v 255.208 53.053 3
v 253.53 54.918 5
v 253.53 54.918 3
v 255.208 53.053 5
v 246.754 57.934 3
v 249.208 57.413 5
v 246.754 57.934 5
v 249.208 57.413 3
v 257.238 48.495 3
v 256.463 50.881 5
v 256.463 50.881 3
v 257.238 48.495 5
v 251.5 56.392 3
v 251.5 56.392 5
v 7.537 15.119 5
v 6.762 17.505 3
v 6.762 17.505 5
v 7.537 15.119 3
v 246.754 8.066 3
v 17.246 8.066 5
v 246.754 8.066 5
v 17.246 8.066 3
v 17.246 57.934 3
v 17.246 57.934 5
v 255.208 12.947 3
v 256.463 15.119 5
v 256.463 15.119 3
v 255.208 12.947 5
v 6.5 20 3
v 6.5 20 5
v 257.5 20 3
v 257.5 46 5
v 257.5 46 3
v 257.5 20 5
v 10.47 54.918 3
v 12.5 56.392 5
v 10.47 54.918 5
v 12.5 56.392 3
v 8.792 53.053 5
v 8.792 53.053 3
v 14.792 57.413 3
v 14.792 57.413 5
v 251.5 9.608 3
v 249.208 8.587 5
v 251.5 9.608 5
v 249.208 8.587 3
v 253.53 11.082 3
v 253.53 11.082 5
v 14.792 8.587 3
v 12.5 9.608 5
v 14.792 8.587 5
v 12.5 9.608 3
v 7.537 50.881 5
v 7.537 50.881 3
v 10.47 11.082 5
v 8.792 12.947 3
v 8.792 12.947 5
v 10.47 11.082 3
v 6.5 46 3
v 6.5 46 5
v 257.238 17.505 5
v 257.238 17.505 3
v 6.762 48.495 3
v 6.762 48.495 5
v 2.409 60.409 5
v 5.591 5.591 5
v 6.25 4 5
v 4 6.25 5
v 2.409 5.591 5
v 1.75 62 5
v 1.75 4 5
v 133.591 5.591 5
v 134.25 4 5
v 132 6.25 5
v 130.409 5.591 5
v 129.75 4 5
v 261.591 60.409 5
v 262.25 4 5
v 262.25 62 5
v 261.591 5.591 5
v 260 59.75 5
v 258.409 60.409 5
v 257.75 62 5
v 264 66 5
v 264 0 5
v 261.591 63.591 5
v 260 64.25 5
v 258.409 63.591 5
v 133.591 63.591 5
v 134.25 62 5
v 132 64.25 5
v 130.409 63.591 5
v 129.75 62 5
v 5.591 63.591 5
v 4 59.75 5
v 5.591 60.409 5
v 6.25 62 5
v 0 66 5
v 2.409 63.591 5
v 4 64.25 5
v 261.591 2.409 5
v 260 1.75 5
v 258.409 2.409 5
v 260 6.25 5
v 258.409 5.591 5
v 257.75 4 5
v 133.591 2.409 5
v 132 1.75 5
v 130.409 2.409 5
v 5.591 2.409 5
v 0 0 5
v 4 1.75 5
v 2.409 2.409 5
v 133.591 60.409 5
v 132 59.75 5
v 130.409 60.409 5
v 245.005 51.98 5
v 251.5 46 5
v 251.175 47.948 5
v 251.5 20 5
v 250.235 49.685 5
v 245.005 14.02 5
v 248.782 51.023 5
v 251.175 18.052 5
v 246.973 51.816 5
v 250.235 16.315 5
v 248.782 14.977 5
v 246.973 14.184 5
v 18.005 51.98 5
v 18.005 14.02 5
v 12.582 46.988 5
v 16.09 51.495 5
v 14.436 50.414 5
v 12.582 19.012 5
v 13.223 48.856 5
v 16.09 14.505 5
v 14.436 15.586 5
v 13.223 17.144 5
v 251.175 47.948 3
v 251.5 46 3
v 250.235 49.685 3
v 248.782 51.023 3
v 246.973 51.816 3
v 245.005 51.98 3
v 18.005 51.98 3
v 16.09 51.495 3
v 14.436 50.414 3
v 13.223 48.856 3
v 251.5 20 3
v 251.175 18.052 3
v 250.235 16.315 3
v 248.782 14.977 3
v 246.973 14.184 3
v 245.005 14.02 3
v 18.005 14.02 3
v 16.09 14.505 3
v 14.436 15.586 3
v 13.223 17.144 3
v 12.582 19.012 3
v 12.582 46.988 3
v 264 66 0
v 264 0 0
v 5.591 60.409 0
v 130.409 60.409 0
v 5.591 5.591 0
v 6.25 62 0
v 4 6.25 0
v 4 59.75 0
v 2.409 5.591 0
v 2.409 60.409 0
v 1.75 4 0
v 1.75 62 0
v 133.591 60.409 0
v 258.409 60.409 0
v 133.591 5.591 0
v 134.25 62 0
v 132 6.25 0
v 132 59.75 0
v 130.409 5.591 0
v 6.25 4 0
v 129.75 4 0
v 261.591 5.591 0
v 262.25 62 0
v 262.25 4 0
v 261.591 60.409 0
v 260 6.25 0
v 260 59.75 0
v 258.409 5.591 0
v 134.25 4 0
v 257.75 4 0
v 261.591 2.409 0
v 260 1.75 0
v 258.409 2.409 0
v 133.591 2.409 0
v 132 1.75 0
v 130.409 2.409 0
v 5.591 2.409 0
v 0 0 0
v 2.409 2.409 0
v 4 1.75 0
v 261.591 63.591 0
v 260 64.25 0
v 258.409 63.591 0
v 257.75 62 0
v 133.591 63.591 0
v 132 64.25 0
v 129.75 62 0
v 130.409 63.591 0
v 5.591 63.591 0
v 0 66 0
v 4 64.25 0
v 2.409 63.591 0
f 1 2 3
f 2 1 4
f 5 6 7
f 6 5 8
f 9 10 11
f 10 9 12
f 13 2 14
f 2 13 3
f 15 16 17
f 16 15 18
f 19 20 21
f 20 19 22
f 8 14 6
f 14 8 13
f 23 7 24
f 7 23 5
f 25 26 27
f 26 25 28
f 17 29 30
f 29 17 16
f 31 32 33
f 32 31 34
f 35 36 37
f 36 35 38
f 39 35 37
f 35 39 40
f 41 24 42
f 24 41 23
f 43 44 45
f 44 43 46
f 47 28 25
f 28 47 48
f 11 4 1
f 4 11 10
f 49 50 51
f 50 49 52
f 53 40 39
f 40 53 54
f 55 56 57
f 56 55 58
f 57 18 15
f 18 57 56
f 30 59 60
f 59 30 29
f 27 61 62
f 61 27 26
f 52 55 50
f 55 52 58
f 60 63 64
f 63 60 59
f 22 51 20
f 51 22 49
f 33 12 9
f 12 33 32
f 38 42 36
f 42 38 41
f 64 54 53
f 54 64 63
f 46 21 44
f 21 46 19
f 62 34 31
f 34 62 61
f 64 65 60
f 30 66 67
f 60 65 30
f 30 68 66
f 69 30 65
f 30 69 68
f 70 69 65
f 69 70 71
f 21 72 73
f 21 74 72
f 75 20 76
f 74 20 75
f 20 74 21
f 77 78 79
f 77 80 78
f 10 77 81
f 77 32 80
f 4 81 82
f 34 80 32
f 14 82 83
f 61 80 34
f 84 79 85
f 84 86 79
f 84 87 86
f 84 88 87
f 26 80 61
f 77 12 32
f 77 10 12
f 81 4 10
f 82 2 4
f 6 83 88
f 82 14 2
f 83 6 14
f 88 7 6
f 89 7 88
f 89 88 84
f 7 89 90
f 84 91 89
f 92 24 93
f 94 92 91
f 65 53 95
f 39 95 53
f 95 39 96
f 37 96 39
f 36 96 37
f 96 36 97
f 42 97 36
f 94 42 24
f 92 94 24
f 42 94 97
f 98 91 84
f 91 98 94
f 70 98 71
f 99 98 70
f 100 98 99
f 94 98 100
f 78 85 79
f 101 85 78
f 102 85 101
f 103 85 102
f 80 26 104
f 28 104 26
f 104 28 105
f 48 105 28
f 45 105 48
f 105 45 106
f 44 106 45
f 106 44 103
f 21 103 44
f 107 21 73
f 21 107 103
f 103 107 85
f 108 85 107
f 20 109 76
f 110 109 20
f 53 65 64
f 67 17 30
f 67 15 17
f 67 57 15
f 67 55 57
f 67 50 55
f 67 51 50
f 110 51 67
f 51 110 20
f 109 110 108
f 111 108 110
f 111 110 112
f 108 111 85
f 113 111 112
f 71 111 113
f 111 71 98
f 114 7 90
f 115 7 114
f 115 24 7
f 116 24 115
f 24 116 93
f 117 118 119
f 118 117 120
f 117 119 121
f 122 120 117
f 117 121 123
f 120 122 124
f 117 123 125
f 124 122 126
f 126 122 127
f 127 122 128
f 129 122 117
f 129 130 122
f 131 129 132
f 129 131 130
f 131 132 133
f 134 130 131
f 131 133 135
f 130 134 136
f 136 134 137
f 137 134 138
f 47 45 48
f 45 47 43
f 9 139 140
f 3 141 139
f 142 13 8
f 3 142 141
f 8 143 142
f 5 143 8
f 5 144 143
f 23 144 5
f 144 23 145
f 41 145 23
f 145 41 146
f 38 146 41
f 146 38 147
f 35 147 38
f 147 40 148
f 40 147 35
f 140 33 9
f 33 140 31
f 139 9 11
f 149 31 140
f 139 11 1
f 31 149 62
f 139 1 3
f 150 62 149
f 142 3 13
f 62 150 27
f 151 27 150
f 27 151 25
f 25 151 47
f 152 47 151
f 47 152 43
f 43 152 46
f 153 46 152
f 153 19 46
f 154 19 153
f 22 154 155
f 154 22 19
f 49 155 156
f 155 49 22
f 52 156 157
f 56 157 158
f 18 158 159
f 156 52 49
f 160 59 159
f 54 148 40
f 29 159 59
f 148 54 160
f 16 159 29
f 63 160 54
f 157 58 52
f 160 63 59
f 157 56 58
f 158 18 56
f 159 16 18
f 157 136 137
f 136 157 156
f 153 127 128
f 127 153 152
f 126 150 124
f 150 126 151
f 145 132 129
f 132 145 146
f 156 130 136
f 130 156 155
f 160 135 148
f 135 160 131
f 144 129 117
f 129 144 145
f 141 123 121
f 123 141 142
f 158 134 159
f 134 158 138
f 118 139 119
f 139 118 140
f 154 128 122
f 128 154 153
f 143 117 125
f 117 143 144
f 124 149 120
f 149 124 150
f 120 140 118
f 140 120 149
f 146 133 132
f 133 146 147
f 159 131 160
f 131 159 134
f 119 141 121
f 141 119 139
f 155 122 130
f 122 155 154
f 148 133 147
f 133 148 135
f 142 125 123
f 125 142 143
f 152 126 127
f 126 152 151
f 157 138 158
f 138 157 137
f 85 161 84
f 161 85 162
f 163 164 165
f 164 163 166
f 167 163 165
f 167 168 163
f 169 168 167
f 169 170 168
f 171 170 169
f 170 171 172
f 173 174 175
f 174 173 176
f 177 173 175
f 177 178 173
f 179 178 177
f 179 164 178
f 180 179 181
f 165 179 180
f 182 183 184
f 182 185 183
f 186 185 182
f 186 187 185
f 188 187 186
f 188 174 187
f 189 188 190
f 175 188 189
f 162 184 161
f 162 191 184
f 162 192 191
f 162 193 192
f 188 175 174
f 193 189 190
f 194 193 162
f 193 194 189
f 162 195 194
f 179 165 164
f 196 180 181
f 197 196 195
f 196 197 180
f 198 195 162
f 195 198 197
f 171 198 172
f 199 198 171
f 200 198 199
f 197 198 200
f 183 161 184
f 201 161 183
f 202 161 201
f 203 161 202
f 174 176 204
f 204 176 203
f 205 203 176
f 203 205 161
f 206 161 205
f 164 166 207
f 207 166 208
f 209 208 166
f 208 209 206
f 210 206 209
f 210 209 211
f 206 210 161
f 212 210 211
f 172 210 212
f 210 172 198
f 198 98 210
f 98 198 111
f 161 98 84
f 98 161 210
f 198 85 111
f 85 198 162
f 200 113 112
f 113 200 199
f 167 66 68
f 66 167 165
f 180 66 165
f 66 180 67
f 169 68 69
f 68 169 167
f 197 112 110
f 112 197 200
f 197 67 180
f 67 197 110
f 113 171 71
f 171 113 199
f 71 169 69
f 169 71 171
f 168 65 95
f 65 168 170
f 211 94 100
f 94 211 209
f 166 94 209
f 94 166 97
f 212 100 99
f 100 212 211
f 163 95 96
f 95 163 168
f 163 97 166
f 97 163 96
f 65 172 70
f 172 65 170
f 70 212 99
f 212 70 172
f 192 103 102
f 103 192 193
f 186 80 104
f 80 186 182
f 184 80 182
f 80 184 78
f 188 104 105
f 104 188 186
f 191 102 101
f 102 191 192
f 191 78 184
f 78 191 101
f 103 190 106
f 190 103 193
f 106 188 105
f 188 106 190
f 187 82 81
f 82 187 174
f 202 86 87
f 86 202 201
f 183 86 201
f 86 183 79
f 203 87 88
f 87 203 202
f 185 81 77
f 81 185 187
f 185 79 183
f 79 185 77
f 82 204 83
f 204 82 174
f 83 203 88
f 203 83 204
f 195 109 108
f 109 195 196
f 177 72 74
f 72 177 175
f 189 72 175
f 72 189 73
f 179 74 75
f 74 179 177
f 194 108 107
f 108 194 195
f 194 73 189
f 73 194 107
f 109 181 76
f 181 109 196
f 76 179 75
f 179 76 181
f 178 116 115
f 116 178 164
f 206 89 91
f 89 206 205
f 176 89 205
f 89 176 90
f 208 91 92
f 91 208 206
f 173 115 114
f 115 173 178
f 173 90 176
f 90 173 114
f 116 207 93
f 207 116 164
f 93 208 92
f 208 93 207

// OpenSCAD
// Lid of sealed substrate chamber for transferring samples between gloveboxes
// without exposing them to air.

// by James Ball, 22-09-2017


// lid parameters
l = 264;
w = 66;
d = 5;

// o-ring parameters
oring_diam = 6; // including tolerance
oring_inner_l = 239;
oring_inner_w = 38;
oring_outer_l = oring_inner_l + 2 * oring_diam;
oring_outer_w = oring_inner_w + 2 * oring_diam;
oring_d = 2;
oring_corner_r = 12;

// screw parameters
screw_buffer = 4;
clearance_diameter = 4.5;

// drill parameters
drill_diameter = 5;

module rounded_cube(l, w, d, r){
    hull(){
        translate([r, r, 0])cylinder(h=d, r=r);
        translate([l - r, r, 0])cylinder(h=d, r=r);
        translate([r, w - r, 0])cylinder(h=d, r=r);
        translate([l - r, w - r, 0])cylinder(h=d, r=r);
    }
}

module screw_clearance(){
    cylinder(h=d, r=clearance_diameter/2);
}

module oring(){
    difference(){
        rounded_cube(oring_outer_l, oring_outer_w, oring_d, oring_corner_r);
        translate([(oring_outer_l - oring_inner_l)/2, (oring_outer_w - oring_inner_w)/2, 0])rounded_cube(oring_inner_l, oring_inner_w, oring_d, oring_corner_r - (oring_outer_l - oring_inner_l)/2);
    }  
}
module lid(){
    difference(){
        cube([l,w,d]);
        translate([(l - oring_outer_l)/2, (w - oring_outer_w)/2, d - oring_d])oring();
        translate([screw_buffer, screw_buffer, 0])screw_clearance();
        translate([screw_buffer, w - screw_buffer, 0])screw_clearance();
        translate([l - screw_buffer, screw_buffer, 0])screw_clearance();
        translate([l - screw_buffer, w - screw_buffer, 0])screw_clearance();
        translate([l/2, screw_buffer, 0])screw_clearance();
        translate([l/2, w - screw_buffer, 0])screw_clearance();
    }
}
lid();
